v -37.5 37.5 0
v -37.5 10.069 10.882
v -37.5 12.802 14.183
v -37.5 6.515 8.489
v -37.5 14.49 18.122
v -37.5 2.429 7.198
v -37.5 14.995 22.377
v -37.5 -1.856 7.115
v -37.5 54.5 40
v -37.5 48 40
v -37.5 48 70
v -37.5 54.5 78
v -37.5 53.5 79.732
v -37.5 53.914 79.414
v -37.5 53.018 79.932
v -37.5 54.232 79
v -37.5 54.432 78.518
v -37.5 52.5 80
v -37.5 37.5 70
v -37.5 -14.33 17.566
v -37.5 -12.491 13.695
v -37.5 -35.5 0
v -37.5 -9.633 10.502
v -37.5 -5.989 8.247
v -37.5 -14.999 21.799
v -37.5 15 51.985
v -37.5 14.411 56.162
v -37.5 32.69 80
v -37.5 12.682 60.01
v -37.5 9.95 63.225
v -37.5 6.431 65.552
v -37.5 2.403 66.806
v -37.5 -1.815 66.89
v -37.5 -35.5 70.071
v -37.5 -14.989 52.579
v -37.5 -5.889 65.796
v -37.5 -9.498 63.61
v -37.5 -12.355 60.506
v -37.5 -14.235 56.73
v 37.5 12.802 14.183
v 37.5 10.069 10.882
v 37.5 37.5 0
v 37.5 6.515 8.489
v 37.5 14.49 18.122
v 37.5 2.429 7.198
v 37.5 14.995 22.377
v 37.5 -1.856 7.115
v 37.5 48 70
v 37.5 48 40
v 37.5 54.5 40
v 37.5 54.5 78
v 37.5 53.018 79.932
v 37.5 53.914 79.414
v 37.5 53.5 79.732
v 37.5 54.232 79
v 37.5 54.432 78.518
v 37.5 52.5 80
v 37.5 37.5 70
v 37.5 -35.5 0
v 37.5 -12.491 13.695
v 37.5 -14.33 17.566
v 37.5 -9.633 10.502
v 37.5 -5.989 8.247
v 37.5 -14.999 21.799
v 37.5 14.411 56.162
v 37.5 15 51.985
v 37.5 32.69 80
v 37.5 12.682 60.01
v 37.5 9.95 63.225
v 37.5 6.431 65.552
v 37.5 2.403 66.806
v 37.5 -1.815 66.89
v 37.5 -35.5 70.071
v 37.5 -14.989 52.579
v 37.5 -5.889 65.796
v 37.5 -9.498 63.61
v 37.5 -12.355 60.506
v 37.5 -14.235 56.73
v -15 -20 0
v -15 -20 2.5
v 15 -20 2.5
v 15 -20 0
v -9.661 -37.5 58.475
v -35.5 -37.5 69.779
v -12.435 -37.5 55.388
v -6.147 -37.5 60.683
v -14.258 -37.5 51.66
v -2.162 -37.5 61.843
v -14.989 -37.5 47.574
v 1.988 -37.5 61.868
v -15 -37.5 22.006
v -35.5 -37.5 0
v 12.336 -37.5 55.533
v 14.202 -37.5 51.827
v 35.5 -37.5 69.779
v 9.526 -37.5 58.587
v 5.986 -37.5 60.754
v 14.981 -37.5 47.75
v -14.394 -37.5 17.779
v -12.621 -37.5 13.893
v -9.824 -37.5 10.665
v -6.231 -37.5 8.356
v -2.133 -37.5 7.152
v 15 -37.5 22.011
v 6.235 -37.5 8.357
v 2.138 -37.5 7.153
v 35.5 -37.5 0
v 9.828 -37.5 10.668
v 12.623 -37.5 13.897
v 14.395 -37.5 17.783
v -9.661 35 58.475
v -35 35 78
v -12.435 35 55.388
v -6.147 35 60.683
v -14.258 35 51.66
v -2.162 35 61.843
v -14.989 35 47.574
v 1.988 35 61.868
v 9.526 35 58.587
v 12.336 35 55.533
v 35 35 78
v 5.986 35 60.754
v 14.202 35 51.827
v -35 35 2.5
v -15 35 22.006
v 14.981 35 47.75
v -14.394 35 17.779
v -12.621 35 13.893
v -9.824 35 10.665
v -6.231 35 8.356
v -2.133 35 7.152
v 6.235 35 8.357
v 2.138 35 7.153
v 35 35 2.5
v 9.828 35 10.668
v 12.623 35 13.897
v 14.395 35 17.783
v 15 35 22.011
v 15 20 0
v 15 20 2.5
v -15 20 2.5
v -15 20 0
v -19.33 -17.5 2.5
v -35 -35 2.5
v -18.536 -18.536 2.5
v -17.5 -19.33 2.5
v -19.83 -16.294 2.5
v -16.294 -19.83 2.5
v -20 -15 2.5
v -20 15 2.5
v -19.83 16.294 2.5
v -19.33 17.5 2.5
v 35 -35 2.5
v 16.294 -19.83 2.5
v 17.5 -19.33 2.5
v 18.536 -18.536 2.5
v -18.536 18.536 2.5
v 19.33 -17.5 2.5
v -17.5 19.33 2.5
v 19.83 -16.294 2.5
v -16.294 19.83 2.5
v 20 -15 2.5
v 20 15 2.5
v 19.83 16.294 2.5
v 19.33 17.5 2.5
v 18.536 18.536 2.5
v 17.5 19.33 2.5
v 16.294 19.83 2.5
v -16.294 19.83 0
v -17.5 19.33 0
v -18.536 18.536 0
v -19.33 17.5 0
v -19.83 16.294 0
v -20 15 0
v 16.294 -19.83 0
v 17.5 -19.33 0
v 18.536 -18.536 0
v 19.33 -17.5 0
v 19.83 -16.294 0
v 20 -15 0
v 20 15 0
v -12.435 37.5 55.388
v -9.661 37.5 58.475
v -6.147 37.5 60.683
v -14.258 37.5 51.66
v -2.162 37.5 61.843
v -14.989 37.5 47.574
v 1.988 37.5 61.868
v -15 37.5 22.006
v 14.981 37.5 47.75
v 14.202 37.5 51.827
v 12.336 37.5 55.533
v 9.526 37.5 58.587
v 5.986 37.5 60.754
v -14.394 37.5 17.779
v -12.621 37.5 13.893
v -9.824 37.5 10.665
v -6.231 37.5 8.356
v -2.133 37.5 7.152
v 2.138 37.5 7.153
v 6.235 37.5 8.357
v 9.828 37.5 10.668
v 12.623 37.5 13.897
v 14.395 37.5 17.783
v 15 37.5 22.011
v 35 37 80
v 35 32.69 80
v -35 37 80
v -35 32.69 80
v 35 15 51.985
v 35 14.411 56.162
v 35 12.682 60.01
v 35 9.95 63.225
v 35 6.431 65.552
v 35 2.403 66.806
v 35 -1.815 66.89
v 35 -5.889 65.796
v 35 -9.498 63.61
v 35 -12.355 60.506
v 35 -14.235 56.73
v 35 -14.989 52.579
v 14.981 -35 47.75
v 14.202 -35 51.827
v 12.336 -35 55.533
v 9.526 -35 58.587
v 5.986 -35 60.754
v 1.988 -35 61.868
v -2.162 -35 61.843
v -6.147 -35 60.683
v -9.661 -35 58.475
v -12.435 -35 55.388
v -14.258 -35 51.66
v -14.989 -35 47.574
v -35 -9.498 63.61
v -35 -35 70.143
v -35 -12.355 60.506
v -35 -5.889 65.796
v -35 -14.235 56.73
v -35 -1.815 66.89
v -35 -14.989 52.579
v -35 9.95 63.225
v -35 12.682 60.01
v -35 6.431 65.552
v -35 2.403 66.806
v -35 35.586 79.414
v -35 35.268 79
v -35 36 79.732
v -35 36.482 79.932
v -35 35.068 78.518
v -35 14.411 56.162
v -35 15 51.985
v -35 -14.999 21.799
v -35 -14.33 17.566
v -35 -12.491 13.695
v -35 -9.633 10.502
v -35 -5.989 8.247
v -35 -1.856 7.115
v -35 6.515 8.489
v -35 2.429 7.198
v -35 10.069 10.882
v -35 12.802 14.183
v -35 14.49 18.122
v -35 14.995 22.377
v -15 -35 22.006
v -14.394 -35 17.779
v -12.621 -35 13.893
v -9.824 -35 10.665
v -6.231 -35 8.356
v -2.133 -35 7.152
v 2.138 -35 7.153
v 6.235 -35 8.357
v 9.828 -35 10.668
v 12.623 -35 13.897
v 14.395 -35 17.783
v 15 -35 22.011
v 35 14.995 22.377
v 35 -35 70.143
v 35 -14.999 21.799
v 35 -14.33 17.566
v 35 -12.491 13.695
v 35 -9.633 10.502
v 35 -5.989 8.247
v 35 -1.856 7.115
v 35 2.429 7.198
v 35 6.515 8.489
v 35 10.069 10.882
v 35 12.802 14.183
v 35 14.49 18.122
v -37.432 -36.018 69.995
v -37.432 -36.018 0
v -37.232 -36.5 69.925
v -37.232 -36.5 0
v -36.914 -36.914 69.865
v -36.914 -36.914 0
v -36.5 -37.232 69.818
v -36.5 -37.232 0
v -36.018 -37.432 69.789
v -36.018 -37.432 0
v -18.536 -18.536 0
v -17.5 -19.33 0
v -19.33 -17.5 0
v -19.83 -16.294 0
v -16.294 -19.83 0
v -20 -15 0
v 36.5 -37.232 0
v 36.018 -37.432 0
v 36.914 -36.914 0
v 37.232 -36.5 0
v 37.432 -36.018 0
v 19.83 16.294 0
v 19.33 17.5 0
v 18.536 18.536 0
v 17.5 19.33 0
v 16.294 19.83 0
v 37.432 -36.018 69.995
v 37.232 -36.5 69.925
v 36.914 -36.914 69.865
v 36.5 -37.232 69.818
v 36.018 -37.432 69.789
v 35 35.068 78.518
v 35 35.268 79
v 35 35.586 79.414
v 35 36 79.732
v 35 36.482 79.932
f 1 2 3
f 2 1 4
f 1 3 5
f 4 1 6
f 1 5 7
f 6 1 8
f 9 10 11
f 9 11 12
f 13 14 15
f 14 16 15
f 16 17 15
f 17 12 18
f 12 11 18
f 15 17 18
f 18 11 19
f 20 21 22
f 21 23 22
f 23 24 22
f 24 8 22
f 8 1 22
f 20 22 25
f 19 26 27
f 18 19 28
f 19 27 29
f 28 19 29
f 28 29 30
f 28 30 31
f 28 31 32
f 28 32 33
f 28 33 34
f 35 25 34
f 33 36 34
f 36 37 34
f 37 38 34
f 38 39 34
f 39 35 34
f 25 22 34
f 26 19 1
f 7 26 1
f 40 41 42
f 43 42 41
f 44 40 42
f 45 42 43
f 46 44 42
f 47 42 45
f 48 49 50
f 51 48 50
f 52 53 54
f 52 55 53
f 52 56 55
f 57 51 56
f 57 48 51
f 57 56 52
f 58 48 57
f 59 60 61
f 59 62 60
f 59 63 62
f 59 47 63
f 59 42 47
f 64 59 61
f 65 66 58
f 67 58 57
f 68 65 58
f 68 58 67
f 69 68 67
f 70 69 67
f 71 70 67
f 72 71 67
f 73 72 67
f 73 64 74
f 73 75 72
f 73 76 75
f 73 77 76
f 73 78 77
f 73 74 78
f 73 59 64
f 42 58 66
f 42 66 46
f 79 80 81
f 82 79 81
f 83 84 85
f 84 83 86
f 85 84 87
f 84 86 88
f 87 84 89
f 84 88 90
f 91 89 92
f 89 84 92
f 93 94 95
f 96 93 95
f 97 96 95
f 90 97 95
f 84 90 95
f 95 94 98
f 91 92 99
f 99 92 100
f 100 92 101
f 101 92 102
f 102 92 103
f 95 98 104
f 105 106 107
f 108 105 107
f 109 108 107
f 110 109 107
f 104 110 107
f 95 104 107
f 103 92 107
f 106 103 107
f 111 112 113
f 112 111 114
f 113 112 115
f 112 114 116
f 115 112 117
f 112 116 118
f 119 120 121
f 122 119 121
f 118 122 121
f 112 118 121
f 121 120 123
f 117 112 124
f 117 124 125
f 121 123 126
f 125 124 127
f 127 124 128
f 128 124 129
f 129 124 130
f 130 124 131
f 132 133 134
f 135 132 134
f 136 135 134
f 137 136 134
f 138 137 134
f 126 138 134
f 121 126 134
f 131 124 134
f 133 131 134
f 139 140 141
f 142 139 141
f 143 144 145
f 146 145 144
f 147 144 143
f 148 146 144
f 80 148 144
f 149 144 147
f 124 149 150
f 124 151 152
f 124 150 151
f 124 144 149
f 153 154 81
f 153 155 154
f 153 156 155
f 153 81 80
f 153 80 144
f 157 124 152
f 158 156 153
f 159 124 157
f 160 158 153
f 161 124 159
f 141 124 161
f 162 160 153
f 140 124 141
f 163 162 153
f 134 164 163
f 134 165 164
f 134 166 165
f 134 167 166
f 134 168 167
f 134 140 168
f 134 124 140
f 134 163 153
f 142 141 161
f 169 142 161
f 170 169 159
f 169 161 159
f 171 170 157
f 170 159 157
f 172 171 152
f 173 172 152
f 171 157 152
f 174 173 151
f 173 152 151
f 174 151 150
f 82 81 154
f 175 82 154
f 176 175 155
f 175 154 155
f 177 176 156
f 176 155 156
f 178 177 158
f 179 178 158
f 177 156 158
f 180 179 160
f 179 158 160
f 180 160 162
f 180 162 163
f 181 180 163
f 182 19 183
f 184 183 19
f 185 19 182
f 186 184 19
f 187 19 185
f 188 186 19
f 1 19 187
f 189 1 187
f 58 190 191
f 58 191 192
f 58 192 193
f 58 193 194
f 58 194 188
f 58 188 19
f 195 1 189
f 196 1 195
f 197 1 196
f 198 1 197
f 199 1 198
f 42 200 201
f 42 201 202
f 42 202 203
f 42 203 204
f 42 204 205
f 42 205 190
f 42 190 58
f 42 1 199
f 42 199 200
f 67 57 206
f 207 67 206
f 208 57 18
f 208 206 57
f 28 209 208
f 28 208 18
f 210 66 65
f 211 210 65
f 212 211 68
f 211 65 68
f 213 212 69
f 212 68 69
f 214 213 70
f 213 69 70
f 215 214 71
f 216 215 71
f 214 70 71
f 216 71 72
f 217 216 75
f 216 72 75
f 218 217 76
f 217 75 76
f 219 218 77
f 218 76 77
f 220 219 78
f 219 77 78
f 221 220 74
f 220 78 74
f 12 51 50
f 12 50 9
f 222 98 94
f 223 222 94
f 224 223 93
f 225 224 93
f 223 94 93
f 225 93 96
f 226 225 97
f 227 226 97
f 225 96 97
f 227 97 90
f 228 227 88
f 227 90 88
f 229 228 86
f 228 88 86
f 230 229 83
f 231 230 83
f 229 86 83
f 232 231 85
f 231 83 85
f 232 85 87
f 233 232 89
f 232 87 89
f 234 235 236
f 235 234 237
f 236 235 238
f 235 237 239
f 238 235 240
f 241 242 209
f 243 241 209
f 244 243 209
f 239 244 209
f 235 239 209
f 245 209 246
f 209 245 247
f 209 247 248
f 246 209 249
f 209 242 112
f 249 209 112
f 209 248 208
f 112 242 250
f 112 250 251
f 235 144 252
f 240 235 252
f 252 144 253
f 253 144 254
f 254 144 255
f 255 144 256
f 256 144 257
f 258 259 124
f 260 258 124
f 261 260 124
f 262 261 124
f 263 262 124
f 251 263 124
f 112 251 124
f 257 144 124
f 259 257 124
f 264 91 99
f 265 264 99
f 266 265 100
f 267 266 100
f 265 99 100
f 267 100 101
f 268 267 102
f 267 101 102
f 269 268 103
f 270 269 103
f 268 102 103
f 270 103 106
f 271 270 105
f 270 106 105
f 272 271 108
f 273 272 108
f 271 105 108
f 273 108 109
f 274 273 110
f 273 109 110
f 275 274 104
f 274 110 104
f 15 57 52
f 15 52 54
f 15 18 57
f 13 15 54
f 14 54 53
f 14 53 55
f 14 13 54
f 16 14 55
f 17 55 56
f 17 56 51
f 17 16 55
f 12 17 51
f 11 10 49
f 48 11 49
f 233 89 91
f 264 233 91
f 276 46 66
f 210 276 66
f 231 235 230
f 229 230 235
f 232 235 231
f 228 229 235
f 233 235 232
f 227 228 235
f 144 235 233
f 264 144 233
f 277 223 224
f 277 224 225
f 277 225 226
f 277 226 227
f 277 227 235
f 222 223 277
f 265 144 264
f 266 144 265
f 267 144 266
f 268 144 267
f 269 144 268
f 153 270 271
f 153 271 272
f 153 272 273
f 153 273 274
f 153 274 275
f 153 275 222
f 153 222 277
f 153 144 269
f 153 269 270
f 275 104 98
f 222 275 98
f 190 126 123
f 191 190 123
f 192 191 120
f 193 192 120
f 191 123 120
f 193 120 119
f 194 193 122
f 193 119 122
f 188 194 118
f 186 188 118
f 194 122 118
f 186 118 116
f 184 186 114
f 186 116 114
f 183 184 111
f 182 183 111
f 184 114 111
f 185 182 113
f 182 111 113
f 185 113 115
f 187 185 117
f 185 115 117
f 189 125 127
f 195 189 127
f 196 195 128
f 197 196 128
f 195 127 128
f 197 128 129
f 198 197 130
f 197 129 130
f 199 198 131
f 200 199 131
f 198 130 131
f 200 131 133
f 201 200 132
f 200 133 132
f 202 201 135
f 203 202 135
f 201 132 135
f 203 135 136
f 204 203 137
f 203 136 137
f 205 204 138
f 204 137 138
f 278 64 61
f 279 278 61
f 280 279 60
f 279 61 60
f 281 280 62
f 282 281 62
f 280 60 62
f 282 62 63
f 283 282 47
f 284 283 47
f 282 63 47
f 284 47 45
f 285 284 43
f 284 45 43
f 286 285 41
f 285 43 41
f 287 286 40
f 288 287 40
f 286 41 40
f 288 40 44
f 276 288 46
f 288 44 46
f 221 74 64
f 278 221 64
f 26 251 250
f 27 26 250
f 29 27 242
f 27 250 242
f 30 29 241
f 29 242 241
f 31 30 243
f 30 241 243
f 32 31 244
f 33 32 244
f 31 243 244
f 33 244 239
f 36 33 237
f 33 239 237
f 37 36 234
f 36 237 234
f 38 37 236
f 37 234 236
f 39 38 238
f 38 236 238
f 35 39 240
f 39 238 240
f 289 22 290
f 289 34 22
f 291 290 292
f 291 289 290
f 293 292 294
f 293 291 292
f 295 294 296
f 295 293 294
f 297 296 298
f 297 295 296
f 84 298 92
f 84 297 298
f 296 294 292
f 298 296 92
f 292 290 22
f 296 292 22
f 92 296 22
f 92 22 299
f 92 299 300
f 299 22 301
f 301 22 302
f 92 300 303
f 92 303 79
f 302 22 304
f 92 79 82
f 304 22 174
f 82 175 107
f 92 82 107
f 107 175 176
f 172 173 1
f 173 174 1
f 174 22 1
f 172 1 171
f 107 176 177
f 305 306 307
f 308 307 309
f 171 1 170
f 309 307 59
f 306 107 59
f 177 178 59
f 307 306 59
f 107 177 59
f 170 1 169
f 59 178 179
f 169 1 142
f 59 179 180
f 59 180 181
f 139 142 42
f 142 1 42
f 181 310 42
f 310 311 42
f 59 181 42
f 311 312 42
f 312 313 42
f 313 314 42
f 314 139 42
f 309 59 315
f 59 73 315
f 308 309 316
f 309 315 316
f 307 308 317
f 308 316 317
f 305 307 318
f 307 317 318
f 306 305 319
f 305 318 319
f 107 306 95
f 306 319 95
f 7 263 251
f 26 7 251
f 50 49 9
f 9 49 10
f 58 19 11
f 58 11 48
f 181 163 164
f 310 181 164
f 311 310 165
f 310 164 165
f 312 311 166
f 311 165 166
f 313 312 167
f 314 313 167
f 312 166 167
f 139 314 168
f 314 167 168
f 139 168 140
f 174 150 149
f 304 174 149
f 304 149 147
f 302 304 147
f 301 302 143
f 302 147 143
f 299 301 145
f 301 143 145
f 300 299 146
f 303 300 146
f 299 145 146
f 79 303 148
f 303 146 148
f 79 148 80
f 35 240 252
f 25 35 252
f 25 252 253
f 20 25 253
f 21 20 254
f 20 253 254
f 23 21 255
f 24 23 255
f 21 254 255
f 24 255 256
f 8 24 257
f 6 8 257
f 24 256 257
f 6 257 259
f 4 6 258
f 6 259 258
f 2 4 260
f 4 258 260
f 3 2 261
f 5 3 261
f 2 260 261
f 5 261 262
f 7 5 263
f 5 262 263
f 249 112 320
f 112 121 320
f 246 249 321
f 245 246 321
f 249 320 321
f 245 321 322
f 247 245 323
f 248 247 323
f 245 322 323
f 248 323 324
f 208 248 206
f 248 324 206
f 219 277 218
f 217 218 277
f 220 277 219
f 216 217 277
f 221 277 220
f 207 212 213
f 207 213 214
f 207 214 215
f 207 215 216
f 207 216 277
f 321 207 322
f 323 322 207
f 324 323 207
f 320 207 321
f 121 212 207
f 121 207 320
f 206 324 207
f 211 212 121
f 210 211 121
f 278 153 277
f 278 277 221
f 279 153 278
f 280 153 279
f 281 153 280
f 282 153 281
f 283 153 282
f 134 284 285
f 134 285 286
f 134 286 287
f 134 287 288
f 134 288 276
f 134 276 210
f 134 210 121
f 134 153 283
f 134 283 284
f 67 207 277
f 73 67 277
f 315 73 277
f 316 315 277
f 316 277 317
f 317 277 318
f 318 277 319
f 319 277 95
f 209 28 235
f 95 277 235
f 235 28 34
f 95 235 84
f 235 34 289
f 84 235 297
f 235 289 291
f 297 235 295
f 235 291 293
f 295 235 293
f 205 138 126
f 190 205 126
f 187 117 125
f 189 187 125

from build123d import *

# Parameters (mm, degrees)
F0_W      = 75
F0_H      = 75
F0_W_2    = 70
F0_H_2    = 70
F1_DEPTH  = 80
F2_T      = -2.5
F4_DEPTH  = 75.001
F5_W      = 75
F5_H      = 40
F6_DEPTH  = 17
F7_W      = 75
F7_H      = 10.5
F8_DEPTH  = 30
F9_R      = 2
F11_DEPTH = 75.001
F13_DEPTH = 80.6
F15_DEPTH = 2.501


with BuildPart() as f1:
    # F0 (on Top) → F1 (new body)
    with BuildSketch(Plane.XY):
        Rectangle(F0_W, F0_H)
        Rectangle(F0_W_2, F0_H_2, mode=Mode.SUBTRACT)
        Rectangle(F0_W_2, F0_H_2)
    extrude(amount=F1_DEPTH)

    # F2
    f2_openings = [f1.faces().sort_by_distance(p)[0] for p in [
        (0, 0, 80),
    ]]
    offset(amount=F2_T, openings=f2_openings)

    # F3 (on face) → F4 (cut, through all)
    with BuildSketch(Plane(origin=(-37.5, 0, 0), x_dir=(0, -1, 0), z_dir=(-1, 0, 0))):
        Polygon((37.5, 80), (-32.6899588108, 80), (37.5, 69.7793290019), align=None)
    extrude(amount=-F4_DEPTH, mode=Mode.SUBTRACT)

    # F5 (on face) → F6 (join)
    with BuildSketch(Plane(origin=(0, 37.5, 0), x_dir=(-1, 0, 0), z_dir=(0, 1, 0))):
        with Locations((0, 60)):
            Rectangle(F5_W, F5_H)
    extrude(amount=F6_DEPTH)

    # F7 (on face) → F8 (cut)
    with BuildSketch(Plane(origin=(0, 0, 40), x_dir=(1, 0, 0), z_dir=(0, 0, -1))):
        with Locations((0, -42.75)):
            Rectangle(F7_W, F7_H)
    extrude(amount=-F8_DEPTH, mode=Mode.SUBTRACT)

    # F9
    f9_edges = [f1.edges().sort_by_distance(p)[0] for p in [
        (0, 54.5, 80),
        (-37.5, -37.5, 34.889665),
        (37.5, -37.5, 34.889665),
        (0, 35, 80),
    ]]
    fillet(f9_edges, radius=F9_R)

    # F10 (on face) → F11 (cut, through all)
    with BuildSketch(Plane.YZ.offset(37.5)):
        with BuildLine():
            Line((-14.9888207723, 52.579009374), (-14.998647473, 21.7985701573))
            ThreePointArc((-14.998647473, 21.7985701573), (0.2893425083, 7.0027908959), (14.9952554508, 22.3772452324))
            Line((14.9952554508, 22.3772452324), (14.9999923512, 51.9848519034))
            ThreePointArc((14.9999923512, 51.9848519034), (0.2971312437, 66.9970568121), (-14.9888207723, 52.579009374))
        make_face()
    extrude(amount=-F11_DEPTH, mode=Mode.SUBTRACT)

    # F12 (on face) → F13 (cut)
    with BuildSketch(Plane.XZ.offset(37.5)):
        with BuildLine():
            Line((-14.9889976507, 47.5744122453), (-14.9999986115, 22.0064539529))
            ThreePointArc((-14.9999986115, 22.0064539529), (0.0022397735, 7.0000001672), (14.9999960153, 22.0109334991))
            Line((14.9999960153, 22.0109334991), (14.9812347551, 47.7500701389))
            ThreePointArc((14.9812347551, 47.7500701389), (-0.0879146719, 61.9997423648), (-14.9889976507, 47.5744122453))
        make_face()
    extrude(amount=-F13_DEPTH, mode=Mode.SUBTRACT)

    # F14 (on face) → F15 (cut, through all)
    with BuildSketch(Plane.XY.offset(2.5)):
        with BuildLine():
            Line((15, 20), (-15, 20))
            ThreePointArc((-15, 20), (-18.5355339059, 18.5355339059), (-20, 15))
            Line((-20, 15), (-20, -15))
            ThreePointArc((-20, -15), (-18.5355339059, -18.5355339059), (-15, -20))
            Line((-15, -20), (15, -20))
            ThreePointArc((15, -20), (18.5355339059, -18.5355339059), (20, -15))
            Line((20, -15), (20, 15))
            ThreePointArc((20, 15), (18.5355339059, 18.5355339059), (15, 20))
        make_face()
    extrude(amount=-F15_DEPTH, mode=Mode.SUBTRACT)


solid = f1.part
